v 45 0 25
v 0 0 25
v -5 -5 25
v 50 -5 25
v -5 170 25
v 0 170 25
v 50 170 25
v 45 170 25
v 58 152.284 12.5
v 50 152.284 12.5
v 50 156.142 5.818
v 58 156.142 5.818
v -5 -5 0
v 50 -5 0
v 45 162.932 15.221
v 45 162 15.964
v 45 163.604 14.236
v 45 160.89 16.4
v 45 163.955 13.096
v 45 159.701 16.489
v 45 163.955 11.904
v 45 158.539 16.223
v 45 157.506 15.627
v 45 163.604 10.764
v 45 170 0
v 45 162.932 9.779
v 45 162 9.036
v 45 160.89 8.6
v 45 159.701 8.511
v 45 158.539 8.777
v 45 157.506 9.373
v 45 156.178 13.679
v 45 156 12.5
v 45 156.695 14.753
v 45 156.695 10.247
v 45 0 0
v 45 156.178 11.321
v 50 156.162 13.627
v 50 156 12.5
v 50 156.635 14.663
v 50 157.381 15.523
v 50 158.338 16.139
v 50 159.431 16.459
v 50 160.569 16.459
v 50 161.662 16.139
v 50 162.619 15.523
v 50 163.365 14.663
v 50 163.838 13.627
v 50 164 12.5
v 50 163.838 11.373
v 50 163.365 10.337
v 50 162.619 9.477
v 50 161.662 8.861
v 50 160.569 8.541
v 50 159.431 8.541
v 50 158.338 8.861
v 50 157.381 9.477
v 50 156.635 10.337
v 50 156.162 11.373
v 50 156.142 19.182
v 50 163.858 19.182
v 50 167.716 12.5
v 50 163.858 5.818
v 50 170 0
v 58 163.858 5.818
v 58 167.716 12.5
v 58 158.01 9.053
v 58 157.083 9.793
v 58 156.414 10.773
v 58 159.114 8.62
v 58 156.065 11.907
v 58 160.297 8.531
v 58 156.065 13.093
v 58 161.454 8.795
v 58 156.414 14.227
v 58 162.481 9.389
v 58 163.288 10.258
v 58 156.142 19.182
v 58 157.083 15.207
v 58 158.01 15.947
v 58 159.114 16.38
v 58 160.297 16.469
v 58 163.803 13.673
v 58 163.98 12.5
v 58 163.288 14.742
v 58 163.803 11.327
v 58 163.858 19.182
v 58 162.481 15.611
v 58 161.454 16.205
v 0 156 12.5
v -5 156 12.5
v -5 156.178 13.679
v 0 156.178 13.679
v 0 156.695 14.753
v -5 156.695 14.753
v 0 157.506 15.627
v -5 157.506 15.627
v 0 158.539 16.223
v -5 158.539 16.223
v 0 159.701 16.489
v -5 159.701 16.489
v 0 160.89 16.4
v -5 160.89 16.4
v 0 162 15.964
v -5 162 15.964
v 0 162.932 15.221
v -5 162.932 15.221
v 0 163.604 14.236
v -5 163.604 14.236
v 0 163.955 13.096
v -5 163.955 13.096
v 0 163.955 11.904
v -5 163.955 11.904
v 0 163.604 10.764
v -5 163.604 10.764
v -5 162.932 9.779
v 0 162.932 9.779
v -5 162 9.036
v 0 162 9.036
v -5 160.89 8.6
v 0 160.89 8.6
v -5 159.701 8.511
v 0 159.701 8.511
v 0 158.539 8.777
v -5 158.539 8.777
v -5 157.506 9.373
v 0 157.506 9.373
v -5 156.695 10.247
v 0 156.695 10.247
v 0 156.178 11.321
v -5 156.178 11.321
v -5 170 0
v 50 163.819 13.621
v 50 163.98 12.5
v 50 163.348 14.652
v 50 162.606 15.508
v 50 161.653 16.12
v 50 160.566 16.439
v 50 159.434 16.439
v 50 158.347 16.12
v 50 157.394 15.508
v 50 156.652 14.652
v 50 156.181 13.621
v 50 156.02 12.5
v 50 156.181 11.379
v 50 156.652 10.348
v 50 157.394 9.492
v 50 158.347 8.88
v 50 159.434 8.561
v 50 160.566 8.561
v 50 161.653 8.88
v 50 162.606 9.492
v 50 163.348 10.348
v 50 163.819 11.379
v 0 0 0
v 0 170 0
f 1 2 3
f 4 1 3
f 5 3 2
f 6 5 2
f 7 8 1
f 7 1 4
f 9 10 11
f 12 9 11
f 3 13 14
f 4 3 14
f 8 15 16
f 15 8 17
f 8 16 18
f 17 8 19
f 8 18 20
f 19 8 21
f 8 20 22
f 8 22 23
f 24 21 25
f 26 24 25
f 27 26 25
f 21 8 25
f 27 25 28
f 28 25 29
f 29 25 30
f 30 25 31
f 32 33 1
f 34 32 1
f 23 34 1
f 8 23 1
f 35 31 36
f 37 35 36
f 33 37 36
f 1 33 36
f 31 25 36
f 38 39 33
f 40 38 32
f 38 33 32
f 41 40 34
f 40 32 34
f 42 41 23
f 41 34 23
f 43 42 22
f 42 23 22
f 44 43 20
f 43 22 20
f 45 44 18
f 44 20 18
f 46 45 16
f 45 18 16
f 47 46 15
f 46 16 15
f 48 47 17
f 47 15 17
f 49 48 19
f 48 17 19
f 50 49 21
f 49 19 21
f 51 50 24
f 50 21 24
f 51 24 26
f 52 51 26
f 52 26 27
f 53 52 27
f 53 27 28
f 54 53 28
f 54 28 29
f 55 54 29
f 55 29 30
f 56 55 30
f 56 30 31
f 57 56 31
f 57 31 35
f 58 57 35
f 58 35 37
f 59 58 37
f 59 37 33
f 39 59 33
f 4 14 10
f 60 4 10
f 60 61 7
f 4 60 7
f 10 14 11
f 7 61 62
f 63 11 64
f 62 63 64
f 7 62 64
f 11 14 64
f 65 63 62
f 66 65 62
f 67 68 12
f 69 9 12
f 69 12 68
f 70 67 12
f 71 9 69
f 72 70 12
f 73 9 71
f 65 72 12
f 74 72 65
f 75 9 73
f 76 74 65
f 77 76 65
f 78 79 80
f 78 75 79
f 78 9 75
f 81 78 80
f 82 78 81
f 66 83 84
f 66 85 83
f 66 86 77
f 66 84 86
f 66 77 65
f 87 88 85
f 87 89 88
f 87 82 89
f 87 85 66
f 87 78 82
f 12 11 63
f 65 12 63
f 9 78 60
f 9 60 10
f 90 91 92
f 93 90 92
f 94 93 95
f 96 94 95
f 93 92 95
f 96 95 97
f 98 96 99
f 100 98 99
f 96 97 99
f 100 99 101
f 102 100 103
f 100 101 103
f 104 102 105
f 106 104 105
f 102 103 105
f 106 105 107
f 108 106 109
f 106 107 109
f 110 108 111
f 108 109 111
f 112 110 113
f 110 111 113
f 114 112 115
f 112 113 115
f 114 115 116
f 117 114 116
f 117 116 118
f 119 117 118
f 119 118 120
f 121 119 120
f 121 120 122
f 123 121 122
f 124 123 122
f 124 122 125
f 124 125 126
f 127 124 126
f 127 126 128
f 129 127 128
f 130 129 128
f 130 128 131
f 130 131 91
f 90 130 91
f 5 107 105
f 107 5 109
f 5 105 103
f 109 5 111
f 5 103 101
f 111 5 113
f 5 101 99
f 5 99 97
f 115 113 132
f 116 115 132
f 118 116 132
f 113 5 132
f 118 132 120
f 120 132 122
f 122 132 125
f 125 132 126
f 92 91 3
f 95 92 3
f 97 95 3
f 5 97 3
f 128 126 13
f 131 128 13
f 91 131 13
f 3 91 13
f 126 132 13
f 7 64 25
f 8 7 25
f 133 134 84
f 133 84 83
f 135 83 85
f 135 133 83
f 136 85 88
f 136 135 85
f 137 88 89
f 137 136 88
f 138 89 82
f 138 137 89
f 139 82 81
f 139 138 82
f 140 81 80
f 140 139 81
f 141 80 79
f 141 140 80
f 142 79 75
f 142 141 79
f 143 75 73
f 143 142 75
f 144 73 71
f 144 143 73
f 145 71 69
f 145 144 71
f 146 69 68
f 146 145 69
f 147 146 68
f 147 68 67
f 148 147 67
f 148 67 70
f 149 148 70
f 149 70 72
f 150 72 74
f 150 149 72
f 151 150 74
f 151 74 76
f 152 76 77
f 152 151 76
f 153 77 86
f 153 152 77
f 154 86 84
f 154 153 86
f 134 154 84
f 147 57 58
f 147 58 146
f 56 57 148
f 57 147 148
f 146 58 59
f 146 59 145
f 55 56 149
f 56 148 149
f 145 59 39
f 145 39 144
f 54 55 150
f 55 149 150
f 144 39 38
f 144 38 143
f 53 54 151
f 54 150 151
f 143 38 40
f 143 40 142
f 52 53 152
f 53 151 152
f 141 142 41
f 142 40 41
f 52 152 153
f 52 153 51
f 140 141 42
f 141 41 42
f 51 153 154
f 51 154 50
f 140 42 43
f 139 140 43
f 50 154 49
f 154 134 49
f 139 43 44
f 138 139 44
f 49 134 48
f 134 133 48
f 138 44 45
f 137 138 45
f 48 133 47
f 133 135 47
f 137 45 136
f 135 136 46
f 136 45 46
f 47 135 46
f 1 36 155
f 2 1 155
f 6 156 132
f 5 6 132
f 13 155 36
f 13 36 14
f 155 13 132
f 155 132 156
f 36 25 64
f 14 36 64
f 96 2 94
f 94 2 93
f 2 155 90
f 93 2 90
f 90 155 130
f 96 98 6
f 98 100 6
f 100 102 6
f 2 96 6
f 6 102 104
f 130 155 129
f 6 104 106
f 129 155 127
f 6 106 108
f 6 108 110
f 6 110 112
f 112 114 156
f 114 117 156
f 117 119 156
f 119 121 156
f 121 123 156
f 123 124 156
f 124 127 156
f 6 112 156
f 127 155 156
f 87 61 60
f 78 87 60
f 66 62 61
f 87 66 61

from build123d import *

# Parameters (mm, degrees)
F1_DEPTH = 25
F2_R     = 4
F3_DEPTH = 132.5
F4_R     = 4
F4_R_2   = 3.9797420395
F5_DEPTH = 8


with BuildPart() as f1:
    # F0 (on Top) → F1 (new body)
    with BuildSketch(Plane.XY):
        Polygon((45, 0), (0, 0), (0, 170), (-5, 170), (-5, -5), (50, -5), (50, 170), (45, 170), align=None)
    extrude(amount=F1_DEPTH)

    # F2 (on face) → F3 (cut)
    with BuildSketch(Plane(origin=(-5, 0, 0), x_dir=(0, -1, 0), z_dir=(-1, 0, 0))):
        with Locations((-160, 12.5)):
            Circle(F2_R)
    extrude(amount=-F3_DEPTH, mode=Mode.SUBTRACT)

    # F4 (on face) → F5 (join)
    with BuildSketch(Plane.YZ.offset(50)):
        Polygon((163.8578503757, 19.1819928586), (156.1421496243, 19.1819928586), (152.2842992487, 12.5), (156.1421496243, 5.8180071414), (163.8578503757, 5.8180071414), (167.7157007513, 12.5), align=None)
        with Locations((160, 12.5)):
            Circle(F4_R, mode=Mode.SUBTRACT)
        with Locations((160, 12.5)):
            Circle(F4_R)
        with Locations((160, 12.5)):
            Circle(F4_R_2, mode=Mode.SUBTRACT)
    extrude(amount=F5_DEPTH)


solid = f1.part
